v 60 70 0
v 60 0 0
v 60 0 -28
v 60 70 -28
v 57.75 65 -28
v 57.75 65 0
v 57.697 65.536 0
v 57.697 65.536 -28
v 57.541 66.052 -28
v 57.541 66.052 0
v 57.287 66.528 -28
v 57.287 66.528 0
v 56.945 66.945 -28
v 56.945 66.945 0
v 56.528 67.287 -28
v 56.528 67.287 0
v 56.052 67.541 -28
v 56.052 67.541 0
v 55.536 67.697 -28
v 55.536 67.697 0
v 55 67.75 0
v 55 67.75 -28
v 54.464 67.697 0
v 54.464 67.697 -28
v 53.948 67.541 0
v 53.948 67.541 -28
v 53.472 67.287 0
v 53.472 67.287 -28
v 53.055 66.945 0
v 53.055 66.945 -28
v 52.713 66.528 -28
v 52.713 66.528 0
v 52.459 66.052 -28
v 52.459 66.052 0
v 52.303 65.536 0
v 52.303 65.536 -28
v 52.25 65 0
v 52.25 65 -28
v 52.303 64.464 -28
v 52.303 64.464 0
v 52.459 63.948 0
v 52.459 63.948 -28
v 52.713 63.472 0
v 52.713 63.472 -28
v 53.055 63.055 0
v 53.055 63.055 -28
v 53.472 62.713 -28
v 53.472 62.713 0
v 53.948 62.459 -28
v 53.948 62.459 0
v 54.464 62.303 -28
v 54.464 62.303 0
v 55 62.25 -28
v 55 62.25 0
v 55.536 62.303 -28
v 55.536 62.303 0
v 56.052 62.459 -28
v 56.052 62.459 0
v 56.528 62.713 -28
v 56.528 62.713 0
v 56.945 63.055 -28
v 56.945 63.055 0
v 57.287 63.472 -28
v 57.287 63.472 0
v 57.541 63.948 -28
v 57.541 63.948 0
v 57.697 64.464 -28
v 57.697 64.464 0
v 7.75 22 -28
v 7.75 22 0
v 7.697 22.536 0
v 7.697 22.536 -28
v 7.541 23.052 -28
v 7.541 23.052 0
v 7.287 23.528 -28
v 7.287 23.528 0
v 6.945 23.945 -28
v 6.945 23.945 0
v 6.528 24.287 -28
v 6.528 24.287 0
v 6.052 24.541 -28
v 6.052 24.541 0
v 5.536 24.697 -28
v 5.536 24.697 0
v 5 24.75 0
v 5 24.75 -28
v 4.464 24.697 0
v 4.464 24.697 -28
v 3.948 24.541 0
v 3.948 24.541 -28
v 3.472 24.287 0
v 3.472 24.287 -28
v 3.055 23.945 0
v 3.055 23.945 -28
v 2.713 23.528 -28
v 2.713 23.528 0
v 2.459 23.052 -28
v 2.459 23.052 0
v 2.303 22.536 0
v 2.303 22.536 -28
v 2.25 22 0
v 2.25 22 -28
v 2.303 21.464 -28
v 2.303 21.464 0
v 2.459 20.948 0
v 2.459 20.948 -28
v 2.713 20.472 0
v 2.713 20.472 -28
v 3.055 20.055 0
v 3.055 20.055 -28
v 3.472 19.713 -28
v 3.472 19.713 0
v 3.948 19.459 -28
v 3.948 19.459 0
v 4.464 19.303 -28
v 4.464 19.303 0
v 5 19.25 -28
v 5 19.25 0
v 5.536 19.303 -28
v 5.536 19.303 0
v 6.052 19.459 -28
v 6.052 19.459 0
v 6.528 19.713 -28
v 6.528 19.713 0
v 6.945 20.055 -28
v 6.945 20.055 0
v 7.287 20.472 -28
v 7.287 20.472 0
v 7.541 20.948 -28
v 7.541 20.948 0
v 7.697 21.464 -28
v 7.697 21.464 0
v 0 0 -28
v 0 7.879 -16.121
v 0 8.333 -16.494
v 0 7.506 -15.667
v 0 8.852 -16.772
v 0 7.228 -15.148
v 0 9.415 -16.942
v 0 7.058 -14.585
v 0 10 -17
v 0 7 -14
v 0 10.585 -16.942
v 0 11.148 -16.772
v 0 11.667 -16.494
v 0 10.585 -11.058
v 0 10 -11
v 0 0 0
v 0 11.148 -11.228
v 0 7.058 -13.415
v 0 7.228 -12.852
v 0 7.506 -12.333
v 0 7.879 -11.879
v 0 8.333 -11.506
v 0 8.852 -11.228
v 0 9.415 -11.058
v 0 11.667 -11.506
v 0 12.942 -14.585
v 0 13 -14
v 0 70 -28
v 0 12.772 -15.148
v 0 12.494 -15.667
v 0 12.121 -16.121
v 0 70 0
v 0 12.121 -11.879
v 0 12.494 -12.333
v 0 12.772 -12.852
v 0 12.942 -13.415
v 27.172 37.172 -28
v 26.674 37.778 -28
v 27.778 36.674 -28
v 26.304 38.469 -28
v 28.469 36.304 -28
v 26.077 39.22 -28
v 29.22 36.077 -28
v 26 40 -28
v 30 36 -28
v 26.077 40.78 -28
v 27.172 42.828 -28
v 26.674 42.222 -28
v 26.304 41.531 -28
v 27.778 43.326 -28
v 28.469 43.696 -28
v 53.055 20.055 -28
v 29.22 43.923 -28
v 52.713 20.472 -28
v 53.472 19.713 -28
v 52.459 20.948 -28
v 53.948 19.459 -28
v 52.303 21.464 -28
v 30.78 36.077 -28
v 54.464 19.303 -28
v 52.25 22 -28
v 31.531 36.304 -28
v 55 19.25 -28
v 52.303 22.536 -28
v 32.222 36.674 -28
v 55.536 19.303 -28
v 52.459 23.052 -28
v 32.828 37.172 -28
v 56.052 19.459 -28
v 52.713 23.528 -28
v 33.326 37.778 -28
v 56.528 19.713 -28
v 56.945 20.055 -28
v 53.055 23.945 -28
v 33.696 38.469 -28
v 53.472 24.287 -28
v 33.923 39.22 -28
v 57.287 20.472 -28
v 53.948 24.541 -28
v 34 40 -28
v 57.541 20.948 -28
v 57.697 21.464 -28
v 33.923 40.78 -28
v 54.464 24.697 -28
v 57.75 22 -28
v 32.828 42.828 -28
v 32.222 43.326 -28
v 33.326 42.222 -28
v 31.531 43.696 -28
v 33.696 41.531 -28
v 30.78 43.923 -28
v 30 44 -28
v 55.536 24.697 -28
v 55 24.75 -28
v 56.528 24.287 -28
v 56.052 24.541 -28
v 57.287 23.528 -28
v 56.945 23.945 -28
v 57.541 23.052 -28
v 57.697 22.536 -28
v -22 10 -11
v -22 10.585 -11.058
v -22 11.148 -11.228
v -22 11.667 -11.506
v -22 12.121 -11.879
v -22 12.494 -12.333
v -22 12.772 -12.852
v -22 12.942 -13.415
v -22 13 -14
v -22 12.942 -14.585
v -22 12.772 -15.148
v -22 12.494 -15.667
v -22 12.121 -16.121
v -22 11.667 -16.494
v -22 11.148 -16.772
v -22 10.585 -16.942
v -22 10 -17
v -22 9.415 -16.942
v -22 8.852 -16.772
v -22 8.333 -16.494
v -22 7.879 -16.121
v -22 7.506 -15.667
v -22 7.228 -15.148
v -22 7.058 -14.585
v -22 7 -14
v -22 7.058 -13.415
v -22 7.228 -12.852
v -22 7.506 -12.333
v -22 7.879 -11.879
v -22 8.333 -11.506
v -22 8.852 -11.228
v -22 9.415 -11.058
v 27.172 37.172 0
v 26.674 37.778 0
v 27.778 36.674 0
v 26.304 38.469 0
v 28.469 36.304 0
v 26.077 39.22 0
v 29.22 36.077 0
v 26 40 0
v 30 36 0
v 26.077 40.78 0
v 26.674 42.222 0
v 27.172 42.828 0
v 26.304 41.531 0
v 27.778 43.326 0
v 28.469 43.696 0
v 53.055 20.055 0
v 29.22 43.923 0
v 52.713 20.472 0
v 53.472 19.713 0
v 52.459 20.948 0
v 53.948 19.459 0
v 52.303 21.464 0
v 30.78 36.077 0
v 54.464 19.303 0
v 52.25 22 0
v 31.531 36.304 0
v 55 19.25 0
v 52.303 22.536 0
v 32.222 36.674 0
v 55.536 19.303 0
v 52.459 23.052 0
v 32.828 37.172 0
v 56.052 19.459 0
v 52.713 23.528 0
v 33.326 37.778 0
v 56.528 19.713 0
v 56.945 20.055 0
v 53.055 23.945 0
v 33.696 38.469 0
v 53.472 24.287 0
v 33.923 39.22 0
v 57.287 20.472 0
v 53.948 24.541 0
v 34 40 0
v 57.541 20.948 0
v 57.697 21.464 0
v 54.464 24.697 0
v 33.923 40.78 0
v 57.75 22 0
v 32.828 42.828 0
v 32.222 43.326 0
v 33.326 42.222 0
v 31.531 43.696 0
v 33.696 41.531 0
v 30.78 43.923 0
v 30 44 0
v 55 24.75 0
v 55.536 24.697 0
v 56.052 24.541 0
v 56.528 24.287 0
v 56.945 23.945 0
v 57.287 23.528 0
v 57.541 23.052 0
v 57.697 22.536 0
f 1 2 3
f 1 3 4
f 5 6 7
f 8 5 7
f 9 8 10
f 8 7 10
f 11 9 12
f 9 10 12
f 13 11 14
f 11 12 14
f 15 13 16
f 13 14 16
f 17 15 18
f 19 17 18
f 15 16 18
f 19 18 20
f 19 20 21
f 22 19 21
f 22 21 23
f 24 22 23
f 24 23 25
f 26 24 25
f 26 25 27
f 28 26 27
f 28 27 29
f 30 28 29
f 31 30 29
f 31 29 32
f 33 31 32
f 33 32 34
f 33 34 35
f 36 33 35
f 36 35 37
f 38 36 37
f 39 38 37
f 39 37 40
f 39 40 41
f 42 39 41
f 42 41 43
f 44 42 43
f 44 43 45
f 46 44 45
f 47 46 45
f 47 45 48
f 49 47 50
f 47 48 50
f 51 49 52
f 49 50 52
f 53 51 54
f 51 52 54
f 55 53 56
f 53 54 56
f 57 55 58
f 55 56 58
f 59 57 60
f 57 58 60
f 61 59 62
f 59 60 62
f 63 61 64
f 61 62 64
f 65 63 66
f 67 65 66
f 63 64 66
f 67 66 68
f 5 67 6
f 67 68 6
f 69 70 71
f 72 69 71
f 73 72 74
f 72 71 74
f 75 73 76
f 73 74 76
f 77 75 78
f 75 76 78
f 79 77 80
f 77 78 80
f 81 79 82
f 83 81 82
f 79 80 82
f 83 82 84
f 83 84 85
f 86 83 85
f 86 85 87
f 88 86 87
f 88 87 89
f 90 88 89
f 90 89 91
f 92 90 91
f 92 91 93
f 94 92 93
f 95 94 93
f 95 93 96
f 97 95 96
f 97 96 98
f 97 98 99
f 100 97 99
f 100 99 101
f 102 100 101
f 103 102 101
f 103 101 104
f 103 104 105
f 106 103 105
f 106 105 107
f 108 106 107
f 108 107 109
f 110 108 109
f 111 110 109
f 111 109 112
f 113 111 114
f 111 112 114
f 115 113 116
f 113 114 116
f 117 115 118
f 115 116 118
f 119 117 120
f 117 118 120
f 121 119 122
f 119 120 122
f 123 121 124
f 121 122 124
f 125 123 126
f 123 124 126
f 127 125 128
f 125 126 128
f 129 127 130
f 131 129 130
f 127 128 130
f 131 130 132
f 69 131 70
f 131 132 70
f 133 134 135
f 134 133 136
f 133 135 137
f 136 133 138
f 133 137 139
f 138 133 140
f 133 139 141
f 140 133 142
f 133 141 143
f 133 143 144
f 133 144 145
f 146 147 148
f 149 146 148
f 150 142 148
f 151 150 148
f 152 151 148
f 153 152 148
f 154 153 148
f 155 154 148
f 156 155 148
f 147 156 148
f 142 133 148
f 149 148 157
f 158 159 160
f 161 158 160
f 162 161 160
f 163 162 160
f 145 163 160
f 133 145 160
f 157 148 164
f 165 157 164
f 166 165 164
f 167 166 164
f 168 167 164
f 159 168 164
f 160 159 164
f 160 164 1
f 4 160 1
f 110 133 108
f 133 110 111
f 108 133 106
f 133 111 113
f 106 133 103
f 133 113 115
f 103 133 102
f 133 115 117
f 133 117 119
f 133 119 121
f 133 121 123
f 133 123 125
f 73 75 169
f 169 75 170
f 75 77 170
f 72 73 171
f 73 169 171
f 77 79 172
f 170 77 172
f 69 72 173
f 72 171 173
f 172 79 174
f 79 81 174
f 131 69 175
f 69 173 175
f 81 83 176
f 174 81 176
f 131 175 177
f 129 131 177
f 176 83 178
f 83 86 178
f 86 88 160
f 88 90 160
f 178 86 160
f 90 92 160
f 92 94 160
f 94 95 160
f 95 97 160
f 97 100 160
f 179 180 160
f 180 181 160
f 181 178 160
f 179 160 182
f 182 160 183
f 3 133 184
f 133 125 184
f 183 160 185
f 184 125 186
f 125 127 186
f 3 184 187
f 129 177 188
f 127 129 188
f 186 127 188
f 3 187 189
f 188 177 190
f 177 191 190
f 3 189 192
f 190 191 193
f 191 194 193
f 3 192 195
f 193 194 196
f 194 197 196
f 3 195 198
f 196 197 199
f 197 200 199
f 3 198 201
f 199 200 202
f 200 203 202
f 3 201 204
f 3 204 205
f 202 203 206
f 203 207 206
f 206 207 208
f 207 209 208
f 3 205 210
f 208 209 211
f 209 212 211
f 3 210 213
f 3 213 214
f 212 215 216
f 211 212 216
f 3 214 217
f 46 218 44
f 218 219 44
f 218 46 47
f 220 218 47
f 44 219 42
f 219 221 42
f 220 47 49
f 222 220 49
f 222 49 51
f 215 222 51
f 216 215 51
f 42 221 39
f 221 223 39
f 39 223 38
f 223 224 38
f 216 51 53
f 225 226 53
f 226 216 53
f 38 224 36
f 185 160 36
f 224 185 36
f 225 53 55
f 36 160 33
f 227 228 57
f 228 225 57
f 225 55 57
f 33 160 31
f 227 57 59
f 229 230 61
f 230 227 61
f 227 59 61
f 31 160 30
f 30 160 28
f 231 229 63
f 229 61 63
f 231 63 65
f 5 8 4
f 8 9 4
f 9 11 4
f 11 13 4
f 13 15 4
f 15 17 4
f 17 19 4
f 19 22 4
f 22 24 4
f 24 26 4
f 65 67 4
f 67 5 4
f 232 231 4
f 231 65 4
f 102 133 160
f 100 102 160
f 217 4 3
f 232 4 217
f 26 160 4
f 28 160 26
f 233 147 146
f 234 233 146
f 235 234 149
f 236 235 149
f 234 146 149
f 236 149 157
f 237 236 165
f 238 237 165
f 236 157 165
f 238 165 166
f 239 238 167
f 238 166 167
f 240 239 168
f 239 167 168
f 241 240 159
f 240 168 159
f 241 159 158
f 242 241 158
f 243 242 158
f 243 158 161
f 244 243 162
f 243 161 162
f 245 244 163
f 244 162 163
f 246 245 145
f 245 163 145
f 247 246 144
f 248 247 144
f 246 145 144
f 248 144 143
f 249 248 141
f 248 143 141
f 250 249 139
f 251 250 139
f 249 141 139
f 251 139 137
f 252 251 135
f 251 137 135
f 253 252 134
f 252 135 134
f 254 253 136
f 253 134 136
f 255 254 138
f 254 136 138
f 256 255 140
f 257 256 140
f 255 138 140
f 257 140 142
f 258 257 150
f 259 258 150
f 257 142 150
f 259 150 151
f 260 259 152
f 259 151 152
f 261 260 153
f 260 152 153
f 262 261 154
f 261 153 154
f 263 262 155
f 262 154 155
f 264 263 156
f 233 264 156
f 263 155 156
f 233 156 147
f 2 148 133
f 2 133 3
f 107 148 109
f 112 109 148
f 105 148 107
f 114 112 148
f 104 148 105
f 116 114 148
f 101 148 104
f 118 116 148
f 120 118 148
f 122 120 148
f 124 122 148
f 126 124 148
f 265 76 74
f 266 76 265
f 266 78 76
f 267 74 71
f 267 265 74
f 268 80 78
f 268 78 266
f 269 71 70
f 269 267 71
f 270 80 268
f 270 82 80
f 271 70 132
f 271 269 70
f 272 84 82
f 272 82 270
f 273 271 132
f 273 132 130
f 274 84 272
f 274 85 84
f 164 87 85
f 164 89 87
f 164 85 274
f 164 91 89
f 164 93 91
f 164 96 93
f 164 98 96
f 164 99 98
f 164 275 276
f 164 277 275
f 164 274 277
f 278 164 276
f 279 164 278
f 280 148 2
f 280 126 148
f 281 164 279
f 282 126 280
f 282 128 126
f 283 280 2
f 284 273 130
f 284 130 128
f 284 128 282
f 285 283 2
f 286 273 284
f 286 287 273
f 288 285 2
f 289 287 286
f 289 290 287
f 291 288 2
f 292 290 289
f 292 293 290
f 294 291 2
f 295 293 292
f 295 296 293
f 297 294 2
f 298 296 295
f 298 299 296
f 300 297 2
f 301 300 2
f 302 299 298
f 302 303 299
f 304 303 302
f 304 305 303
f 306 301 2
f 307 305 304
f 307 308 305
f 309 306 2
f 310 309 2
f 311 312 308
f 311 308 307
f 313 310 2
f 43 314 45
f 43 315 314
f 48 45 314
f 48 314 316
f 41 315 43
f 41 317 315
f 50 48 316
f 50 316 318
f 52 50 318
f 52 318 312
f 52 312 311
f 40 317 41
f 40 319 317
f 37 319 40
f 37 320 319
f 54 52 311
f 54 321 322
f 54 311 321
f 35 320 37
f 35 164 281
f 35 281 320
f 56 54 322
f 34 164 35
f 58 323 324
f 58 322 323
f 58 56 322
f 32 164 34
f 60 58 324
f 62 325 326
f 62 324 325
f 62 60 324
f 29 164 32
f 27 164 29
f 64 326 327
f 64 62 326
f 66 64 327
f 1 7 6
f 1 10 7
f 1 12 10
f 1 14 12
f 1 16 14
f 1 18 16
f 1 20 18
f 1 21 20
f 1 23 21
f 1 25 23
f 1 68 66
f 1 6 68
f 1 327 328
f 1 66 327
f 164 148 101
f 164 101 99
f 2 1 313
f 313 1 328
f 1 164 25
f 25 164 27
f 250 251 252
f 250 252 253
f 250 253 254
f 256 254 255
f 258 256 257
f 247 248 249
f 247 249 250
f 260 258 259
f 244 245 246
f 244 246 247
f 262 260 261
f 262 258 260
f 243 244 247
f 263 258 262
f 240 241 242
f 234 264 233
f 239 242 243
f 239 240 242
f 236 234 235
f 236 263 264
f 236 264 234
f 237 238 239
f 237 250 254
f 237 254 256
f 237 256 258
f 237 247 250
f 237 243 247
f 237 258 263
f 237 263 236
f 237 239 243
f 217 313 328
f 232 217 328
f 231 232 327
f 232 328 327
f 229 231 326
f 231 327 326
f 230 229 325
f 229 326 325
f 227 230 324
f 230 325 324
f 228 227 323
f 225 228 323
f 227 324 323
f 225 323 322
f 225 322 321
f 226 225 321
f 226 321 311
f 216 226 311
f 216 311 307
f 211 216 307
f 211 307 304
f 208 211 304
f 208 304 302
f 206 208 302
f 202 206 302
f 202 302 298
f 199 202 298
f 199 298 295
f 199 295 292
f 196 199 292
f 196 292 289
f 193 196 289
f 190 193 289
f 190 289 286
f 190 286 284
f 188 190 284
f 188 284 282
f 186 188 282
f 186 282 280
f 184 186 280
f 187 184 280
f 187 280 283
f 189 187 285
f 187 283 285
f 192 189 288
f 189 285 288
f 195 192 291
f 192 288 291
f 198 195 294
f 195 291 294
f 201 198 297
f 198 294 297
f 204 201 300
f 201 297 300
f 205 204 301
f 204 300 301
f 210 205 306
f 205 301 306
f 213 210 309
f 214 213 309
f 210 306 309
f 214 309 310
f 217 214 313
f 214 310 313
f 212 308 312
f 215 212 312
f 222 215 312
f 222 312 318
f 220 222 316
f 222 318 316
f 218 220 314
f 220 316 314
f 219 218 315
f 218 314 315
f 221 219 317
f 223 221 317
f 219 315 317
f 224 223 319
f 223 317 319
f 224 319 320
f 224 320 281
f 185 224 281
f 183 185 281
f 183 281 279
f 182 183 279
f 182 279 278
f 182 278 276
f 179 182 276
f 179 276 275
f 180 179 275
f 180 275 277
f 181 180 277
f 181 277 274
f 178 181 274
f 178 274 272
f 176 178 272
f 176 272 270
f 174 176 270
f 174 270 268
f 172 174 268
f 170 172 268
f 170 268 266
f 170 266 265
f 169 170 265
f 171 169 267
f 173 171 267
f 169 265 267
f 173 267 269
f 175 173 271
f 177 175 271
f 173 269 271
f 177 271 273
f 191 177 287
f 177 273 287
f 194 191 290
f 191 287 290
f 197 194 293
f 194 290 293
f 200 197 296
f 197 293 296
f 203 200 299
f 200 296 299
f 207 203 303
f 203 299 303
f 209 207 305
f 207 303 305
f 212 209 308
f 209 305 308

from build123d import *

# Parameters (mm, degrees)
ESQUISSE1_W      = 60
ESQUISSE1_H      = 70
EXTRUSION1_DEPTH = 28
ESQUISSE2_R      = 3
EXTRUSION2_DEPTH = 22
EXTRUSION3_REACH = 98.354
ESQUISSE3_R      = 4
D_GAGEMENT_M51_D = 5.5


with BuildPart() as part:
    # Esquisse1 → Extrusion1 (new body)
    with BuildSketch(Plane.XY):
        with Locations((30, 35)):
            Rectangle(ESQUISSE1_W, ESQUISSE1_H)
    extrude(amount=-EXTRUSION1_DEPTH)

    # Esquisse2 → Extrusion2 (add)
    with BuildSketch(Plane.ZY):
        with Locations((-14, 10)):
            Circle(ESQUISSE2_R)
    extrude(amount=EXTRUSION2_DEPTH)

    # Esquisse3 → Extrusion3 (cut, up to next)
    with BuildSketch(Plane.XY, mode=Mode.PRIVATE) as extrusion3_sk1:
        with Locations((30, 40)):
            Circle(ESQUISSE3_R)
    extrusion3_tool1 = extrude(extrusion3_sk1.sketch, amount=-EXTRUSION3_REACH, mode=Mode.PRIVATE) & part.part
    add(extrusion3_tool1.solids().sort_by_distance((30, 40, 0))[0], mode=Mode.SUBTRACT)

    # Dégagement M51 (through all)
    with Locations(Plane(origin=(55, 22, -28), x_dir=(-1, 0, 0), z_dir=(0, 0, -1))):
        with Locations((0, 0), (0, 43), (50, 0)):
            Hole(D_GAGEMENT_M51_D / 2)


solid = part.part
